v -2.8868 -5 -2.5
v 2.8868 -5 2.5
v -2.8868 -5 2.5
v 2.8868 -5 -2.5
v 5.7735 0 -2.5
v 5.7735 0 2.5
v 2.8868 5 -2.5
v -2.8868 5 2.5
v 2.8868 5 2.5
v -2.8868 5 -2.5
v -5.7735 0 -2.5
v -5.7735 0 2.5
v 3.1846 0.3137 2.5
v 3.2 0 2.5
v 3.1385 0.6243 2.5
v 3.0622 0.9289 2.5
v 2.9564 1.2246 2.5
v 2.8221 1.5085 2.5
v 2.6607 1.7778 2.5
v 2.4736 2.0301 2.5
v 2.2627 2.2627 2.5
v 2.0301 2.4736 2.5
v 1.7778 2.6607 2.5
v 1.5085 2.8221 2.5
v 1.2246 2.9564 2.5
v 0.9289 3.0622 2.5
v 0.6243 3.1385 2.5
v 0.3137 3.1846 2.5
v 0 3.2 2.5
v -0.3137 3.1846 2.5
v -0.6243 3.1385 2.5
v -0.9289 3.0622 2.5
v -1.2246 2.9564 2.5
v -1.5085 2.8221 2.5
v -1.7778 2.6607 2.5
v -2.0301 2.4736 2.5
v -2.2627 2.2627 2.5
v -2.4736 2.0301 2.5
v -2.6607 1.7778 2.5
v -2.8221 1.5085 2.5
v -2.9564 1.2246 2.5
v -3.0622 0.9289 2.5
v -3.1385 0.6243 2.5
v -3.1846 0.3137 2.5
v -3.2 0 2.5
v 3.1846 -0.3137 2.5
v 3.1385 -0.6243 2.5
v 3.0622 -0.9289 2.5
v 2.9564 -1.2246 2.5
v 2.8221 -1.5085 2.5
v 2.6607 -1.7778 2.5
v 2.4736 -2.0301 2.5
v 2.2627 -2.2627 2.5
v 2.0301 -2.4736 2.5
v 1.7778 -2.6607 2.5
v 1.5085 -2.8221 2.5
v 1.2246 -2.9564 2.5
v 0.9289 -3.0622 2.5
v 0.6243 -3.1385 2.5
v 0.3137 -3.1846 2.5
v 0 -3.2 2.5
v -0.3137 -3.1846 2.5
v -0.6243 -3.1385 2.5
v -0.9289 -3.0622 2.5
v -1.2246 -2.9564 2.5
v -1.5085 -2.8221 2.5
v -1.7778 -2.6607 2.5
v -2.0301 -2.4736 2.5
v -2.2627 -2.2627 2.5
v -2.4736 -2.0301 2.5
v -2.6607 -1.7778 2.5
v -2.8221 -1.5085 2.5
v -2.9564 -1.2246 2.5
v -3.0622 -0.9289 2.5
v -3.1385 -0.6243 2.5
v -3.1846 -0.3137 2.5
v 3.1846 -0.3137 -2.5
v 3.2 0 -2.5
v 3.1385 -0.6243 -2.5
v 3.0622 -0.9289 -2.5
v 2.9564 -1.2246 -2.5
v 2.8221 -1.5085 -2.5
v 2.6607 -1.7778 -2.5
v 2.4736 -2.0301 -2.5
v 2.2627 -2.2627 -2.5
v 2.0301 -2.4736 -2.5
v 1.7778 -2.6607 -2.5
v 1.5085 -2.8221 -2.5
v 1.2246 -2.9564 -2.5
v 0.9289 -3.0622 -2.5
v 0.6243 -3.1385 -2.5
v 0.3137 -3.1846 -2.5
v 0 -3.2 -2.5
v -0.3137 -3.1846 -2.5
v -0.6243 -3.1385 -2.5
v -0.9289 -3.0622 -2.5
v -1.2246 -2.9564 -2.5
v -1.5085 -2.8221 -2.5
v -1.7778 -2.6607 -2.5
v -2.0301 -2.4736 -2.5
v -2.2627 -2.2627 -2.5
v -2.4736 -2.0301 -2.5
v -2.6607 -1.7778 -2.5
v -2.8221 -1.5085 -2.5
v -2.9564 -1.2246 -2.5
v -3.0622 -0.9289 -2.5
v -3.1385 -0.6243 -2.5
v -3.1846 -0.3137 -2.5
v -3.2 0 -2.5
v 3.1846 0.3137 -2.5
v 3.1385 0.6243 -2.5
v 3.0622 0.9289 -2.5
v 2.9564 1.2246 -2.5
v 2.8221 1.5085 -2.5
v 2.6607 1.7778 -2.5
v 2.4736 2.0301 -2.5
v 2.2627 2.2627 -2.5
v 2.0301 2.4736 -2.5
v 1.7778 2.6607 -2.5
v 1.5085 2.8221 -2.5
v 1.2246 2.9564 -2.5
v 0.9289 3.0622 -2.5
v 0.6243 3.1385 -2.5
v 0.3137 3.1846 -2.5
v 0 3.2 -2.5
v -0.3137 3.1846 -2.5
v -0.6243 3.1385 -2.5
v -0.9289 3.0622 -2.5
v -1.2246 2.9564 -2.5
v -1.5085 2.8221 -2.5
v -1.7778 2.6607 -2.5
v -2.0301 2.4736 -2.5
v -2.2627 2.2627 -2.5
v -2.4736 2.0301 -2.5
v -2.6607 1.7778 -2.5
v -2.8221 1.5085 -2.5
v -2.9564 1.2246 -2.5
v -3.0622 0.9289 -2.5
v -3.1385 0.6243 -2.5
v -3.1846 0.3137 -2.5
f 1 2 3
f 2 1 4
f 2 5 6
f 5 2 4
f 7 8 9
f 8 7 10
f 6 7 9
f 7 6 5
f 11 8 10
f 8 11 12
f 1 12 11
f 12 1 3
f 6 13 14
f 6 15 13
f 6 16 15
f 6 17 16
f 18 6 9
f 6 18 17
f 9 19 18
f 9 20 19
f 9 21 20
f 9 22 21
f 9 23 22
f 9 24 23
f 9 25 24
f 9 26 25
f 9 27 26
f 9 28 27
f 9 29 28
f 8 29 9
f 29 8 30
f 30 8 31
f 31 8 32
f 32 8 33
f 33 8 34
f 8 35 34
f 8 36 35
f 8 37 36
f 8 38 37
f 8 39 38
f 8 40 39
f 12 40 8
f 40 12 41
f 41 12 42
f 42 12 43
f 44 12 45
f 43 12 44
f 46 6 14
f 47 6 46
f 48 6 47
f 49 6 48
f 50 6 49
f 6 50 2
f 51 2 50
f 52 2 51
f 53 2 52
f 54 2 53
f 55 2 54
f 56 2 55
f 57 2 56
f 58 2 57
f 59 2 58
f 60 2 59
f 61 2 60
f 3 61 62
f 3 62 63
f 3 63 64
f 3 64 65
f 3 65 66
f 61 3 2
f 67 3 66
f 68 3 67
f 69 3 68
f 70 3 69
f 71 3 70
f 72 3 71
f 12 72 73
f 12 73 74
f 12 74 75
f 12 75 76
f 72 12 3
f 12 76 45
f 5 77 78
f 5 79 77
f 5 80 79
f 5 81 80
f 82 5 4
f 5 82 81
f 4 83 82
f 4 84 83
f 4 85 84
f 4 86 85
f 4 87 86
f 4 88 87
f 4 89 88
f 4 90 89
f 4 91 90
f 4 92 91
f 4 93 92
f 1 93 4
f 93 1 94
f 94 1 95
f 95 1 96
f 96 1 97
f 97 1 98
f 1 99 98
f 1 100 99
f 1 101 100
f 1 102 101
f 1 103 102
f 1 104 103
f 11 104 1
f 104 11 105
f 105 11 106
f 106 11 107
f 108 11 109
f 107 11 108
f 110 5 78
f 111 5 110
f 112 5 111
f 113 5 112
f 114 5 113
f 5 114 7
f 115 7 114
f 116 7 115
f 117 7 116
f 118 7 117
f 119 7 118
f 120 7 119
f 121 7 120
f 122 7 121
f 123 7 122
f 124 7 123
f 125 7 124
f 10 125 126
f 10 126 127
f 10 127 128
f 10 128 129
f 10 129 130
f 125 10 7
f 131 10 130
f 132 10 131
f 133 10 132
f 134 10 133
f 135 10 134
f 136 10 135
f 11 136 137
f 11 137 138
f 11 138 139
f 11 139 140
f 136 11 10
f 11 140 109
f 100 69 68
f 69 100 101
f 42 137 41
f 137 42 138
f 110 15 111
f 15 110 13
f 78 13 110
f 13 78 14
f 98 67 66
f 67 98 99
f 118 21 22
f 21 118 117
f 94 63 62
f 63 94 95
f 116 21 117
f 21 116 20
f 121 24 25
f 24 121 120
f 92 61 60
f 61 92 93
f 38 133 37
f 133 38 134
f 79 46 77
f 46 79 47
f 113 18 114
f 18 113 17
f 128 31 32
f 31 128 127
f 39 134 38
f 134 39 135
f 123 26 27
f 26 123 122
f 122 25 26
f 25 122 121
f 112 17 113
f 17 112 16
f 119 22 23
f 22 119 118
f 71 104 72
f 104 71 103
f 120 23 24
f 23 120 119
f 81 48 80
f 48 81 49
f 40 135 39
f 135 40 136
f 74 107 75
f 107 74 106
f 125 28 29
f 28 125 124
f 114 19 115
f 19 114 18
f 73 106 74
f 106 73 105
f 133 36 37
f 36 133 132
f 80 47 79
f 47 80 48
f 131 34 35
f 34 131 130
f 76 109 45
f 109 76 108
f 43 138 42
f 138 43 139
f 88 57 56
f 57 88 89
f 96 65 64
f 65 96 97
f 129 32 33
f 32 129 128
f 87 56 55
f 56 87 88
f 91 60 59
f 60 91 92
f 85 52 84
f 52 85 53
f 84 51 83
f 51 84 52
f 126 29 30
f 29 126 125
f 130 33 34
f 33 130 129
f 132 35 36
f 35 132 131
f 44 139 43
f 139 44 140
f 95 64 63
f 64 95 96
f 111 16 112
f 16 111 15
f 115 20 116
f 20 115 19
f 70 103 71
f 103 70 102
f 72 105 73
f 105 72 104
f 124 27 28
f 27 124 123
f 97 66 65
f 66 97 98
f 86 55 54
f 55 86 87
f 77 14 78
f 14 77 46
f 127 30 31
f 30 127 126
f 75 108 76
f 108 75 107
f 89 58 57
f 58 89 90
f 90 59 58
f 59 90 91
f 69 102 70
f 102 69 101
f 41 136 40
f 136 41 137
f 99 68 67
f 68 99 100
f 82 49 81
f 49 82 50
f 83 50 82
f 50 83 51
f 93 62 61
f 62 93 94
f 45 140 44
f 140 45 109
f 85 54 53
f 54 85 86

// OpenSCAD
across_flats = 10.0;
thickness = 5.0;
hole_diameter = 6.4;
circ_r = across_flats / 1.7320508075688772;
difference() {
  cylinder(h=thickness, r=circ_r, center=true, $fn=6);
  cylinder(h=thickness + 0.2, r=hole_diameter/2, center=true, $fn=64);
}
